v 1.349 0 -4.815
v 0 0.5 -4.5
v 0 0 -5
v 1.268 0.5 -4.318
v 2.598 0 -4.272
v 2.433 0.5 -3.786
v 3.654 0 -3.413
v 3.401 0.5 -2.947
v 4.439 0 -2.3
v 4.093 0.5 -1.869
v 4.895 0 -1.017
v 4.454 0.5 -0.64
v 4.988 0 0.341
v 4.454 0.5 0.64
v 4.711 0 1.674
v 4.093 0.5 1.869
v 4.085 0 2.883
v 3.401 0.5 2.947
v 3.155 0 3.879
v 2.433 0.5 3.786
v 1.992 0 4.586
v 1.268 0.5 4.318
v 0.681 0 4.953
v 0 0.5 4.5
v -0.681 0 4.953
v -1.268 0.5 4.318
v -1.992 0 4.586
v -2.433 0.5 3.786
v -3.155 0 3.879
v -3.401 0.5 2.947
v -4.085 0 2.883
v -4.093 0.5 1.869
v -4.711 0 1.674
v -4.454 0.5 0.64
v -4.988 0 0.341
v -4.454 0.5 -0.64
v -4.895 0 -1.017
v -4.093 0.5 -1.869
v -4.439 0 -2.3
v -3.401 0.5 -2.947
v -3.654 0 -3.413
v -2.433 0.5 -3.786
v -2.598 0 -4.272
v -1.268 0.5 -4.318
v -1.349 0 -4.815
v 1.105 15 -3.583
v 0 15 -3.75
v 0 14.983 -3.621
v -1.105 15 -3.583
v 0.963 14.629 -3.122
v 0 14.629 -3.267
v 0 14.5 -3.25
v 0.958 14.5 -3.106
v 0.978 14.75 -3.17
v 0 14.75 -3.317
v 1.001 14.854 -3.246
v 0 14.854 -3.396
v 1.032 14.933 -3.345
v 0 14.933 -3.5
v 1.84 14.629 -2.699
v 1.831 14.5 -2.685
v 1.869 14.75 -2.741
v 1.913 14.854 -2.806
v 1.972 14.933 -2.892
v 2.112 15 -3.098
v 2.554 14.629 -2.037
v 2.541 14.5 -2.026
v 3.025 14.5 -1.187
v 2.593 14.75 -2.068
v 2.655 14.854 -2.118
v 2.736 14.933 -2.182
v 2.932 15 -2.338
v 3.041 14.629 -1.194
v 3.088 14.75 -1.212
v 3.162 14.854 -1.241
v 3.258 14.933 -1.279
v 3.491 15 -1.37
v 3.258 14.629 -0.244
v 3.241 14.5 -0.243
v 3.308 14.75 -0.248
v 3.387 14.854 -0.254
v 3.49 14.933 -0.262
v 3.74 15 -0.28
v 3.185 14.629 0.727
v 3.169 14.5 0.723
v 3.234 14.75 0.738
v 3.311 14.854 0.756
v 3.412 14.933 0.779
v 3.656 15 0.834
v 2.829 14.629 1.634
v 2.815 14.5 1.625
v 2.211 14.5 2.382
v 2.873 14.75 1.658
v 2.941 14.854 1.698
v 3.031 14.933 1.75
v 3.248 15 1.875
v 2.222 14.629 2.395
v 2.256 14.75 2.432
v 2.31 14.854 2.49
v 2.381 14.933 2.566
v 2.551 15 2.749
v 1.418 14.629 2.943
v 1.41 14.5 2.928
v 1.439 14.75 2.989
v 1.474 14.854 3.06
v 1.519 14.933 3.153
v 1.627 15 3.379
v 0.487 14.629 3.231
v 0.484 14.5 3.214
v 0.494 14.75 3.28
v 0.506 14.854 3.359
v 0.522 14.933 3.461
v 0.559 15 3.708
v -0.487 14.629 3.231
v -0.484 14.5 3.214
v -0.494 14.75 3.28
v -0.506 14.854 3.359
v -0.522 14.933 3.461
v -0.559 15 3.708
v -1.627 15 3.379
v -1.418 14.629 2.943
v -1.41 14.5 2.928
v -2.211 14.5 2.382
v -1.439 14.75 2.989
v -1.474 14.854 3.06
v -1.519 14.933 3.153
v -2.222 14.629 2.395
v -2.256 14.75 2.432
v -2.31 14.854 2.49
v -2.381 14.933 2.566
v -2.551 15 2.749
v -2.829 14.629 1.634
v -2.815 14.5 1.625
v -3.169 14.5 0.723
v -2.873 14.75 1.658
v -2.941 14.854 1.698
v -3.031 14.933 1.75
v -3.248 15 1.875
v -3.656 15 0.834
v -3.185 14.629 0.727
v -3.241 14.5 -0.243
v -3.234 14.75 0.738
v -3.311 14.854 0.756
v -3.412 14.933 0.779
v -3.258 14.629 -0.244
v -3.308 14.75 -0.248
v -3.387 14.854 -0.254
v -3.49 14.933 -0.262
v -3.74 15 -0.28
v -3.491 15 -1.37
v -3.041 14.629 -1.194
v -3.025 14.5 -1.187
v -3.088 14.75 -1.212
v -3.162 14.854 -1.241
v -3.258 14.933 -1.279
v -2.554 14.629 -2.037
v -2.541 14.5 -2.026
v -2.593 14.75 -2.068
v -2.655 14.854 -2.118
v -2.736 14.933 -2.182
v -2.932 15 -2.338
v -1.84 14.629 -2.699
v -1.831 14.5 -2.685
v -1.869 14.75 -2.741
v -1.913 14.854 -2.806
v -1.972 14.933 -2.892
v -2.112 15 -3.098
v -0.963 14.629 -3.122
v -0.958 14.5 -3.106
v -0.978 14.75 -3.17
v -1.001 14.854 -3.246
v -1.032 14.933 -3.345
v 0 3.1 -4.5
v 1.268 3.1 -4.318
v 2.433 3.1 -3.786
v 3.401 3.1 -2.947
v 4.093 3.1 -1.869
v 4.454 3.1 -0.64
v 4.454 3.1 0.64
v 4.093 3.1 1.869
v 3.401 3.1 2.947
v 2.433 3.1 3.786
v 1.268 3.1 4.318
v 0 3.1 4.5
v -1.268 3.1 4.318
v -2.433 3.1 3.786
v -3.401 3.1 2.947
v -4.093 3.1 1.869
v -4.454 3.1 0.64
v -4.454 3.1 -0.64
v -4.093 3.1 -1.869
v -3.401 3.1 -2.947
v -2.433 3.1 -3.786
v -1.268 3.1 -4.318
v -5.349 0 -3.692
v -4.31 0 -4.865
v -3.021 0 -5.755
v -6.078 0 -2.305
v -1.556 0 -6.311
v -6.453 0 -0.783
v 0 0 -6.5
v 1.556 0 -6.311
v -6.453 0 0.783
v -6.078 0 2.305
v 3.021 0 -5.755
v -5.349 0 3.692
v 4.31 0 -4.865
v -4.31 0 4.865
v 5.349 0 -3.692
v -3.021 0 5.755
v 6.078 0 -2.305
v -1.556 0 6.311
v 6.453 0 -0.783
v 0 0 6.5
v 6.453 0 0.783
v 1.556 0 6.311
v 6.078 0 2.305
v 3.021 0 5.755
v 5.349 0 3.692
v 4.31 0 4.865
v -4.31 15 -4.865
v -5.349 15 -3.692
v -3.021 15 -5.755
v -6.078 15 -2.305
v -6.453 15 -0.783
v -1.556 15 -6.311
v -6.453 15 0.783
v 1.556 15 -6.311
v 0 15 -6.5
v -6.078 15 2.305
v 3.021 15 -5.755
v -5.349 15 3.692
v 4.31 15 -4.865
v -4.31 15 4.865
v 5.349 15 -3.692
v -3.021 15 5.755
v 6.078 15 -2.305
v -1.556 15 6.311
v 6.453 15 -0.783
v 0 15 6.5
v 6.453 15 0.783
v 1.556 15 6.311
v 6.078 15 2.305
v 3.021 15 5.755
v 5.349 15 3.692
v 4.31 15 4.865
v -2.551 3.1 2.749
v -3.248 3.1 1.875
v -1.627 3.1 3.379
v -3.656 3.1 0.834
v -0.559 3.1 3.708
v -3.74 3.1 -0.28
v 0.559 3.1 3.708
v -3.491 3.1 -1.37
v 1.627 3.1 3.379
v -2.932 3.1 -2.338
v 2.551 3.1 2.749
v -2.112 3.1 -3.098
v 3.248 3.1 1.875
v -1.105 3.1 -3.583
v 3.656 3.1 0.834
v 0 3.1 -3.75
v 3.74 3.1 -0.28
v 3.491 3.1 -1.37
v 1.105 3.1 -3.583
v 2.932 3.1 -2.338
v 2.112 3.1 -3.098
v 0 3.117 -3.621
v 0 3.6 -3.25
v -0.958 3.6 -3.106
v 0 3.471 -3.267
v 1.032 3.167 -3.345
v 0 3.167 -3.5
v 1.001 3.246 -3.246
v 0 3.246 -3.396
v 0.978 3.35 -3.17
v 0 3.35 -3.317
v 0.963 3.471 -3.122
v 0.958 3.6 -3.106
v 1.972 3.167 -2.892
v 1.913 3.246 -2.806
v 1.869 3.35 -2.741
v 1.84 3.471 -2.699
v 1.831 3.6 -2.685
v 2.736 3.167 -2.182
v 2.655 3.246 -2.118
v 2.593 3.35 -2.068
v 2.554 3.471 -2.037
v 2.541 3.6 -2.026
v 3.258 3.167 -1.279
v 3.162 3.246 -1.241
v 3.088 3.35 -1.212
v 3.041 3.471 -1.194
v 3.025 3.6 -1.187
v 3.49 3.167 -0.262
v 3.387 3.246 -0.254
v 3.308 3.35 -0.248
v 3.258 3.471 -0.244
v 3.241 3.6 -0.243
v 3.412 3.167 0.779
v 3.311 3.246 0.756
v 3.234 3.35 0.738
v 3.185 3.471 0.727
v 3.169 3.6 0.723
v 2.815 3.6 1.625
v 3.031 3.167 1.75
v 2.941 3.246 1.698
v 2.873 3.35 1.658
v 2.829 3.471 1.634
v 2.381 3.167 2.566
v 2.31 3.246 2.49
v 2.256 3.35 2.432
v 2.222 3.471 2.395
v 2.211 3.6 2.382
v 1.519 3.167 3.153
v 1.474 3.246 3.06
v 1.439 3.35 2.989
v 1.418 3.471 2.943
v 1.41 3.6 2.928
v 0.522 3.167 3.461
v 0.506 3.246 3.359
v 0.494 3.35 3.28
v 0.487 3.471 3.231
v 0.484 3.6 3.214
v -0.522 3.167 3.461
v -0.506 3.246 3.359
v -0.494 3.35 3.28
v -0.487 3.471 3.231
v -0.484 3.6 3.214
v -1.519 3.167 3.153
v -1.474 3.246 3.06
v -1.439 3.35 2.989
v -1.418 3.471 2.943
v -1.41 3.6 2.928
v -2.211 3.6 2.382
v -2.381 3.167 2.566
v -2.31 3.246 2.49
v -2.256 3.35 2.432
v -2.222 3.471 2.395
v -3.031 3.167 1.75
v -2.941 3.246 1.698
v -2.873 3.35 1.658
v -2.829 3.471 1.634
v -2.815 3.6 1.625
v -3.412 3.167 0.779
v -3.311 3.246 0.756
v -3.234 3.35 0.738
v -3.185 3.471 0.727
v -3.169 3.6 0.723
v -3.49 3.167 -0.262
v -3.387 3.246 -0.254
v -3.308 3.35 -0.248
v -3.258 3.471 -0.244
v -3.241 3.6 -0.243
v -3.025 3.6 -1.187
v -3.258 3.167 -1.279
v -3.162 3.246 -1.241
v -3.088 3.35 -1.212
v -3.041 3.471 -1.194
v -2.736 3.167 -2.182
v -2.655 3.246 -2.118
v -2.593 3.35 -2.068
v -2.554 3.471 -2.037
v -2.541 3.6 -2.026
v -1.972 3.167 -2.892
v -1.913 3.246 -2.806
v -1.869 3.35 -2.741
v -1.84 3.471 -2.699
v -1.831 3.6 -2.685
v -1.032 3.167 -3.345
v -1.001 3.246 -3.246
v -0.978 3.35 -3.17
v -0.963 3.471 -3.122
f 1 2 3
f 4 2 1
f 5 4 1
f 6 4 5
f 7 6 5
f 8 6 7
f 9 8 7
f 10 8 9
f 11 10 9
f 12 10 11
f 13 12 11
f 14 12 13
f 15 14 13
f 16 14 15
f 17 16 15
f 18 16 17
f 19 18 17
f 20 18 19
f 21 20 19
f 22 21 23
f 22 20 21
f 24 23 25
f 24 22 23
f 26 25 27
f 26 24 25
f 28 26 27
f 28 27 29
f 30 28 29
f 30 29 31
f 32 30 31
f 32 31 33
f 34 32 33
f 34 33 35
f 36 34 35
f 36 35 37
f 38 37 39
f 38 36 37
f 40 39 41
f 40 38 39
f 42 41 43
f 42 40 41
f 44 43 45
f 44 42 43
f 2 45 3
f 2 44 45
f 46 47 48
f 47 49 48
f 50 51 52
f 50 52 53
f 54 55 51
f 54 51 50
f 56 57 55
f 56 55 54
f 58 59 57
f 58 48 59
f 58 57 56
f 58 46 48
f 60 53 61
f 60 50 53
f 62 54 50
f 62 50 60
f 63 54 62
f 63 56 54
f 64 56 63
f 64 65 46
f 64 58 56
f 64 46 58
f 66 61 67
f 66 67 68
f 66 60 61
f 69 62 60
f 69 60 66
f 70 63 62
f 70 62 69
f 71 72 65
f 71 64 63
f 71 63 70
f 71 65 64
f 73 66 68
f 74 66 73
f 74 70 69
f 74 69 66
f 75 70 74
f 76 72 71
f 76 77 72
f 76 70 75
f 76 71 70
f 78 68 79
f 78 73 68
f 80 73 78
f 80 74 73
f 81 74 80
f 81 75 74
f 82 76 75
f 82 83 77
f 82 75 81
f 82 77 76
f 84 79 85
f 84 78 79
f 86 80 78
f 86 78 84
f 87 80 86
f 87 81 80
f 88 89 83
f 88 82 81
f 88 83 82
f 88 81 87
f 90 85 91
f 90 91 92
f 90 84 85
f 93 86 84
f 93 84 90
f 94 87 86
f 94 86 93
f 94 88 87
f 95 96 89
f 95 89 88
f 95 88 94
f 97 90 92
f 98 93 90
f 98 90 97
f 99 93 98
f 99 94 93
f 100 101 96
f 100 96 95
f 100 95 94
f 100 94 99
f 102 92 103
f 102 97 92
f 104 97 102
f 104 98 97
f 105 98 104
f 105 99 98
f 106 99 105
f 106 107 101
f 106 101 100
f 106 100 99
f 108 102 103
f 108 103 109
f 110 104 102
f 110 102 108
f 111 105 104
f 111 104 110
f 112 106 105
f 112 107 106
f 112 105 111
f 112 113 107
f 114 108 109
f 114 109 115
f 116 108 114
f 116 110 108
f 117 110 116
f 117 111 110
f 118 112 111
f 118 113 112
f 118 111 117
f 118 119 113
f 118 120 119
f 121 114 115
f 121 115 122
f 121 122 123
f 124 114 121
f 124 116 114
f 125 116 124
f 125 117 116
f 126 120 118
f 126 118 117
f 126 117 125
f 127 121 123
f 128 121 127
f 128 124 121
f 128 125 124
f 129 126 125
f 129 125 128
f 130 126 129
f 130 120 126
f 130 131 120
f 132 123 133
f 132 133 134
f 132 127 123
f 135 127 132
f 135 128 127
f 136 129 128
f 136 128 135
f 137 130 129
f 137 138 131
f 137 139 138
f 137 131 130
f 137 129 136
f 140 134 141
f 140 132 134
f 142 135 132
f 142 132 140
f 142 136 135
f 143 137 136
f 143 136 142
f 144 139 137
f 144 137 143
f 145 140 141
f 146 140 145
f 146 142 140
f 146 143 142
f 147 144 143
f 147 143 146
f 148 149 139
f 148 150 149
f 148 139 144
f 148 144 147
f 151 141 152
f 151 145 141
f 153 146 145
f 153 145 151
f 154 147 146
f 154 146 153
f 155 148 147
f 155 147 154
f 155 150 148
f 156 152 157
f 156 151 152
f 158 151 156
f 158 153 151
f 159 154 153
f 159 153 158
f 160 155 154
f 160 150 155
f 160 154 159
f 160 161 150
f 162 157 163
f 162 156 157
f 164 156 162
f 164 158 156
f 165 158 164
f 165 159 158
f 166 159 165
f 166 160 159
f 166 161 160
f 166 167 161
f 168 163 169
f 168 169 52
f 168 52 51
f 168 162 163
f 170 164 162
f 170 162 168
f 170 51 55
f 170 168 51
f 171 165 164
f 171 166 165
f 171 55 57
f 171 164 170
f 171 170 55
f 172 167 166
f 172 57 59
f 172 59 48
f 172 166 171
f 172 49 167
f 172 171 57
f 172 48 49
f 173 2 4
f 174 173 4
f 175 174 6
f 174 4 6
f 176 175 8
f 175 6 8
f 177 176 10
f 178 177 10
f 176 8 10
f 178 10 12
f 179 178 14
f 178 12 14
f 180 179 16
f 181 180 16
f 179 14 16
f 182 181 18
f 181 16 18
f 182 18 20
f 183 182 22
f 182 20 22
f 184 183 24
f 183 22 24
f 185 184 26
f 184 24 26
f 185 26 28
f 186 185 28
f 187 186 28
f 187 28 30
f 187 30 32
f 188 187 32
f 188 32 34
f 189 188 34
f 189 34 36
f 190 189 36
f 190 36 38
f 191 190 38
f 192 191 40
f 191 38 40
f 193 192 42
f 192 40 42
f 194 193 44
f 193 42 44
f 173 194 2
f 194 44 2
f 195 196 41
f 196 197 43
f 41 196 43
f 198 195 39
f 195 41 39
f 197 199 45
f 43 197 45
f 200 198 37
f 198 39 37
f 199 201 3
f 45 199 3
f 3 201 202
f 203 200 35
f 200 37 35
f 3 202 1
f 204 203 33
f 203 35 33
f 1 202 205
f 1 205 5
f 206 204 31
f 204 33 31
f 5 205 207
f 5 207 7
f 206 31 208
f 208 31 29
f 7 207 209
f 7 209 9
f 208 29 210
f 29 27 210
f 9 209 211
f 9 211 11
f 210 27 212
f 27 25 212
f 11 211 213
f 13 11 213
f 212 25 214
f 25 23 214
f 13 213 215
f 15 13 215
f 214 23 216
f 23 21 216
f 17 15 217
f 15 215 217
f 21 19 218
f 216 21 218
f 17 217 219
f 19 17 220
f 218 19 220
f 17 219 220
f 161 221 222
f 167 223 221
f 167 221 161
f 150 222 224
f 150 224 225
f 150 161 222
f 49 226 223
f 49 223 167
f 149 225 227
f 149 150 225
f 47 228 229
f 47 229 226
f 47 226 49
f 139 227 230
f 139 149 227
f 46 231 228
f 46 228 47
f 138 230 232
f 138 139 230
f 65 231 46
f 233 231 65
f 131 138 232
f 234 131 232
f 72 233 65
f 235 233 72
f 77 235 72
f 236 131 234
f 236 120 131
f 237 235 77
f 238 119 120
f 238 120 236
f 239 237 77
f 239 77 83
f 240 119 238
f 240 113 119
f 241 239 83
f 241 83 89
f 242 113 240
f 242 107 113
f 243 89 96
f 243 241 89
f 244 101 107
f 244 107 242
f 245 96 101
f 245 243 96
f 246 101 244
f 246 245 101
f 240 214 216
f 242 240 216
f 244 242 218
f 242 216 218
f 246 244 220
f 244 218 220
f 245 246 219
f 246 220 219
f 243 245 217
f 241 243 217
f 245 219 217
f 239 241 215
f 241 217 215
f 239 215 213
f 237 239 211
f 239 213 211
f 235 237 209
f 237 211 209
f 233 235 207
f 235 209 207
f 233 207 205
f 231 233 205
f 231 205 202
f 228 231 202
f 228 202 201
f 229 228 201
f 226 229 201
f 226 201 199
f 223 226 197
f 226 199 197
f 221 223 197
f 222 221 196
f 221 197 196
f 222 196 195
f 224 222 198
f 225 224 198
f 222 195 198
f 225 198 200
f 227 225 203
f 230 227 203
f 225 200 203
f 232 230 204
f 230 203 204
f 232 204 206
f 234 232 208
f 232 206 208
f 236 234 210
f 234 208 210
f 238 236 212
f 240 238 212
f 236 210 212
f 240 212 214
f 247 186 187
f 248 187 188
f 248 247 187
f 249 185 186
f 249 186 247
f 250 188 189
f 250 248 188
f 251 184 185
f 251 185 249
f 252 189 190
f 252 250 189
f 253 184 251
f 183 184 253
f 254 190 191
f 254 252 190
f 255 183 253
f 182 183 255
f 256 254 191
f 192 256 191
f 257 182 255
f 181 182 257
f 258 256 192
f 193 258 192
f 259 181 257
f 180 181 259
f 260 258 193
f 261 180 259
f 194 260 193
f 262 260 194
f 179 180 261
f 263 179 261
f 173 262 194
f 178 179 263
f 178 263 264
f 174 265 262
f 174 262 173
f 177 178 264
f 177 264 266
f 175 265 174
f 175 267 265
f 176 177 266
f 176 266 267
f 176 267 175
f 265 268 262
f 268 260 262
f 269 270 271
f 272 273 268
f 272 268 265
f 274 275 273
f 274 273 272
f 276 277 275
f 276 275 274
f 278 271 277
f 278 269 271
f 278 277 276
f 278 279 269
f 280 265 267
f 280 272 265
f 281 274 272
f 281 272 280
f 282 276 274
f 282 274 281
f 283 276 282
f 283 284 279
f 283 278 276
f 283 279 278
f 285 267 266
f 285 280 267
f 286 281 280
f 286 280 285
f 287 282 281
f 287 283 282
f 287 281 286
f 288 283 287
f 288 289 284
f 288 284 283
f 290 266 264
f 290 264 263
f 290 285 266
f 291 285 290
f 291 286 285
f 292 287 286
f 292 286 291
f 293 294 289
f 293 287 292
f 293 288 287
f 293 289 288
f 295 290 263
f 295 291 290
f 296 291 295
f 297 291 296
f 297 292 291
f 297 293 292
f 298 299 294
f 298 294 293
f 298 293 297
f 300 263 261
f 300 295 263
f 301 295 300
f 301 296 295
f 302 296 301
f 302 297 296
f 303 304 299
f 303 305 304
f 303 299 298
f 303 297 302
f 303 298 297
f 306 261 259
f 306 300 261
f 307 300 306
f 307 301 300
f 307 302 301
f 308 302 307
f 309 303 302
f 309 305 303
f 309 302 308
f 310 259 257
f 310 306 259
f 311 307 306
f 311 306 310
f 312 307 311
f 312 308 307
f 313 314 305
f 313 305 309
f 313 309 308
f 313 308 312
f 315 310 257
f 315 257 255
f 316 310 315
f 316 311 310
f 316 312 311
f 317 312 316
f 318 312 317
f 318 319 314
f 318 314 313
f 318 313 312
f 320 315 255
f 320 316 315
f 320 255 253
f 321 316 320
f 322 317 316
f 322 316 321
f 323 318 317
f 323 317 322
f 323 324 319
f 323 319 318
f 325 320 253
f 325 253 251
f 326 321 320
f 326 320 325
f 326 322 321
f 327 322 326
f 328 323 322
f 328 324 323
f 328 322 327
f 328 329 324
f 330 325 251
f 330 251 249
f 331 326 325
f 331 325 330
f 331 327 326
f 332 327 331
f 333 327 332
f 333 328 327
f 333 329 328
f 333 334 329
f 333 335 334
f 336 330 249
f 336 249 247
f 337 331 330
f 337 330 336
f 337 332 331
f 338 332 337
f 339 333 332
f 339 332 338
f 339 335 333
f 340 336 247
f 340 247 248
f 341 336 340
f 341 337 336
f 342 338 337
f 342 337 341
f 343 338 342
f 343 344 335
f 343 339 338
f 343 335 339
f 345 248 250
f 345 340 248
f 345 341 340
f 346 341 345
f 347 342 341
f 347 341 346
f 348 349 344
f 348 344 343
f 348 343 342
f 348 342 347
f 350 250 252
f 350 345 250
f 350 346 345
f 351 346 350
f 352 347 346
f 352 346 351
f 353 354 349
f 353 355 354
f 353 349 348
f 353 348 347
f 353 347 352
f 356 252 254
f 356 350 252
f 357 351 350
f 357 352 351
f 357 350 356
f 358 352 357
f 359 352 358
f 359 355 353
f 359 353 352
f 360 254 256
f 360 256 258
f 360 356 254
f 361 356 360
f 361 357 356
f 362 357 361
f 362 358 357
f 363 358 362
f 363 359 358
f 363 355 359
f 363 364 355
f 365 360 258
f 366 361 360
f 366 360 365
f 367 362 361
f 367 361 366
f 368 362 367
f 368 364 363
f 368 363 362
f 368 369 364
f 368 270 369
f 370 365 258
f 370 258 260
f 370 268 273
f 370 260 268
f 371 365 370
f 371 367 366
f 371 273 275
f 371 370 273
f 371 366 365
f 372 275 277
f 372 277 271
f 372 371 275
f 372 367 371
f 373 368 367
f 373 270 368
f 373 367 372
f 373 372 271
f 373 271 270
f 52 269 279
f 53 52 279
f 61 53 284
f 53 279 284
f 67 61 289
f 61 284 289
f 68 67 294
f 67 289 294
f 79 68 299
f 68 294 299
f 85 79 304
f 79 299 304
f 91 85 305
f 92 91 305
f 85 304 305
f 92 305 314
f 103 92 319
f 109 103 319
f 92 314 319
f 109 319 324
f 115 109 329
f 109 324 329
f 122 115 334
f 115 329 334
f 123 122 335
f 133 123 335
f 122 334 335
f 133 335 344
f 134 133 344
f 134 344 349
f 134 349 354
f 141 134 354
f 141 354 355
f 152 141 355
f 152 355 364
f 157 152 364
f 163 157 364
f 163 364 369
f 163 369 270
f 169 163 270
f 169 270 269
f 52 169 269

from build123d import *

# Parameters (mm, degrees)
ESBO_O1_R                = 6.5
RESSALTO_EXTRUS_O1_DEPTH = 15
ESBO_O4_R                = 4.5
CORTE_EXTRUS_O1_DEPTH    = 3.1
ESBO_O5_R                = 3.25
CORTE_EXTRUS_O2_DEPTH    = 16.036954479
CHANFRO1_SIZE            = 0.5
FILETE1_R                = 0.5
FILETE2_R                = 0.5


with BuildPart() as part:
    # Esboço1 → Ressalto-extrusão1 (new body)
    with BuildSketch(Plane(origin=(0, 0, 0), x_dir=(1, 0, 0), z_dir=(0, 1, 0))):
        with Locations(Location((0, 0, 0), (0, 0, 270))):
            Circle(ESBO_O1_R)
    extrude(amount=RESSALTO_EXTRUS_O1_DEPTH)

    # Esboço4 → Corte-extrusão1 (cut)
    with BuildSketch(Plane.XZ):
        with Locations(Location((0, 0, 0), (0, 0, 270))):
            Circle(ESBO_O4_R)
    extrude(amount=-CORTE_EXTRUS_O1_DEPTH, mode=Mode.SUBTRACT)

    # Esboço5 → Corte-extrusão2 (cut, through all)
    with BuildSketch(Plane.XZ.offset(-3.1)):
        with Locations(Location((0, 0, 0), (0, 0, 270))):
            Circle(ESBO_O5_R)
    extrude(amount=-CORTE_EXTRUS_O2_DEPTH, mode=Mode.SUBTRACT)

    # Chanfro1
    chanfro1_edges = [part.edges().sort_by_distance(p)[0] for p in [
        (0, 0, 4.5),
    ]]
    chamfer(chanfro1_edges, length=CHANFRO1_SIZE)

    # Filete1
    filete1_edges = [part.edges().sort_by_distance(p)[0] for p in [
        (0, 3.1, 3.25),
    ]]
    fillet(filete1_edges, radius=FILETE1_R)

    # Filete2
    filete2_edges = [part.edges().sort_by_distance(p)[0] for p in [
        (0, 15, 3.25),
    ]]
    fillet(filete2_edges, radius=FILETE2_R)


solid = part.part
